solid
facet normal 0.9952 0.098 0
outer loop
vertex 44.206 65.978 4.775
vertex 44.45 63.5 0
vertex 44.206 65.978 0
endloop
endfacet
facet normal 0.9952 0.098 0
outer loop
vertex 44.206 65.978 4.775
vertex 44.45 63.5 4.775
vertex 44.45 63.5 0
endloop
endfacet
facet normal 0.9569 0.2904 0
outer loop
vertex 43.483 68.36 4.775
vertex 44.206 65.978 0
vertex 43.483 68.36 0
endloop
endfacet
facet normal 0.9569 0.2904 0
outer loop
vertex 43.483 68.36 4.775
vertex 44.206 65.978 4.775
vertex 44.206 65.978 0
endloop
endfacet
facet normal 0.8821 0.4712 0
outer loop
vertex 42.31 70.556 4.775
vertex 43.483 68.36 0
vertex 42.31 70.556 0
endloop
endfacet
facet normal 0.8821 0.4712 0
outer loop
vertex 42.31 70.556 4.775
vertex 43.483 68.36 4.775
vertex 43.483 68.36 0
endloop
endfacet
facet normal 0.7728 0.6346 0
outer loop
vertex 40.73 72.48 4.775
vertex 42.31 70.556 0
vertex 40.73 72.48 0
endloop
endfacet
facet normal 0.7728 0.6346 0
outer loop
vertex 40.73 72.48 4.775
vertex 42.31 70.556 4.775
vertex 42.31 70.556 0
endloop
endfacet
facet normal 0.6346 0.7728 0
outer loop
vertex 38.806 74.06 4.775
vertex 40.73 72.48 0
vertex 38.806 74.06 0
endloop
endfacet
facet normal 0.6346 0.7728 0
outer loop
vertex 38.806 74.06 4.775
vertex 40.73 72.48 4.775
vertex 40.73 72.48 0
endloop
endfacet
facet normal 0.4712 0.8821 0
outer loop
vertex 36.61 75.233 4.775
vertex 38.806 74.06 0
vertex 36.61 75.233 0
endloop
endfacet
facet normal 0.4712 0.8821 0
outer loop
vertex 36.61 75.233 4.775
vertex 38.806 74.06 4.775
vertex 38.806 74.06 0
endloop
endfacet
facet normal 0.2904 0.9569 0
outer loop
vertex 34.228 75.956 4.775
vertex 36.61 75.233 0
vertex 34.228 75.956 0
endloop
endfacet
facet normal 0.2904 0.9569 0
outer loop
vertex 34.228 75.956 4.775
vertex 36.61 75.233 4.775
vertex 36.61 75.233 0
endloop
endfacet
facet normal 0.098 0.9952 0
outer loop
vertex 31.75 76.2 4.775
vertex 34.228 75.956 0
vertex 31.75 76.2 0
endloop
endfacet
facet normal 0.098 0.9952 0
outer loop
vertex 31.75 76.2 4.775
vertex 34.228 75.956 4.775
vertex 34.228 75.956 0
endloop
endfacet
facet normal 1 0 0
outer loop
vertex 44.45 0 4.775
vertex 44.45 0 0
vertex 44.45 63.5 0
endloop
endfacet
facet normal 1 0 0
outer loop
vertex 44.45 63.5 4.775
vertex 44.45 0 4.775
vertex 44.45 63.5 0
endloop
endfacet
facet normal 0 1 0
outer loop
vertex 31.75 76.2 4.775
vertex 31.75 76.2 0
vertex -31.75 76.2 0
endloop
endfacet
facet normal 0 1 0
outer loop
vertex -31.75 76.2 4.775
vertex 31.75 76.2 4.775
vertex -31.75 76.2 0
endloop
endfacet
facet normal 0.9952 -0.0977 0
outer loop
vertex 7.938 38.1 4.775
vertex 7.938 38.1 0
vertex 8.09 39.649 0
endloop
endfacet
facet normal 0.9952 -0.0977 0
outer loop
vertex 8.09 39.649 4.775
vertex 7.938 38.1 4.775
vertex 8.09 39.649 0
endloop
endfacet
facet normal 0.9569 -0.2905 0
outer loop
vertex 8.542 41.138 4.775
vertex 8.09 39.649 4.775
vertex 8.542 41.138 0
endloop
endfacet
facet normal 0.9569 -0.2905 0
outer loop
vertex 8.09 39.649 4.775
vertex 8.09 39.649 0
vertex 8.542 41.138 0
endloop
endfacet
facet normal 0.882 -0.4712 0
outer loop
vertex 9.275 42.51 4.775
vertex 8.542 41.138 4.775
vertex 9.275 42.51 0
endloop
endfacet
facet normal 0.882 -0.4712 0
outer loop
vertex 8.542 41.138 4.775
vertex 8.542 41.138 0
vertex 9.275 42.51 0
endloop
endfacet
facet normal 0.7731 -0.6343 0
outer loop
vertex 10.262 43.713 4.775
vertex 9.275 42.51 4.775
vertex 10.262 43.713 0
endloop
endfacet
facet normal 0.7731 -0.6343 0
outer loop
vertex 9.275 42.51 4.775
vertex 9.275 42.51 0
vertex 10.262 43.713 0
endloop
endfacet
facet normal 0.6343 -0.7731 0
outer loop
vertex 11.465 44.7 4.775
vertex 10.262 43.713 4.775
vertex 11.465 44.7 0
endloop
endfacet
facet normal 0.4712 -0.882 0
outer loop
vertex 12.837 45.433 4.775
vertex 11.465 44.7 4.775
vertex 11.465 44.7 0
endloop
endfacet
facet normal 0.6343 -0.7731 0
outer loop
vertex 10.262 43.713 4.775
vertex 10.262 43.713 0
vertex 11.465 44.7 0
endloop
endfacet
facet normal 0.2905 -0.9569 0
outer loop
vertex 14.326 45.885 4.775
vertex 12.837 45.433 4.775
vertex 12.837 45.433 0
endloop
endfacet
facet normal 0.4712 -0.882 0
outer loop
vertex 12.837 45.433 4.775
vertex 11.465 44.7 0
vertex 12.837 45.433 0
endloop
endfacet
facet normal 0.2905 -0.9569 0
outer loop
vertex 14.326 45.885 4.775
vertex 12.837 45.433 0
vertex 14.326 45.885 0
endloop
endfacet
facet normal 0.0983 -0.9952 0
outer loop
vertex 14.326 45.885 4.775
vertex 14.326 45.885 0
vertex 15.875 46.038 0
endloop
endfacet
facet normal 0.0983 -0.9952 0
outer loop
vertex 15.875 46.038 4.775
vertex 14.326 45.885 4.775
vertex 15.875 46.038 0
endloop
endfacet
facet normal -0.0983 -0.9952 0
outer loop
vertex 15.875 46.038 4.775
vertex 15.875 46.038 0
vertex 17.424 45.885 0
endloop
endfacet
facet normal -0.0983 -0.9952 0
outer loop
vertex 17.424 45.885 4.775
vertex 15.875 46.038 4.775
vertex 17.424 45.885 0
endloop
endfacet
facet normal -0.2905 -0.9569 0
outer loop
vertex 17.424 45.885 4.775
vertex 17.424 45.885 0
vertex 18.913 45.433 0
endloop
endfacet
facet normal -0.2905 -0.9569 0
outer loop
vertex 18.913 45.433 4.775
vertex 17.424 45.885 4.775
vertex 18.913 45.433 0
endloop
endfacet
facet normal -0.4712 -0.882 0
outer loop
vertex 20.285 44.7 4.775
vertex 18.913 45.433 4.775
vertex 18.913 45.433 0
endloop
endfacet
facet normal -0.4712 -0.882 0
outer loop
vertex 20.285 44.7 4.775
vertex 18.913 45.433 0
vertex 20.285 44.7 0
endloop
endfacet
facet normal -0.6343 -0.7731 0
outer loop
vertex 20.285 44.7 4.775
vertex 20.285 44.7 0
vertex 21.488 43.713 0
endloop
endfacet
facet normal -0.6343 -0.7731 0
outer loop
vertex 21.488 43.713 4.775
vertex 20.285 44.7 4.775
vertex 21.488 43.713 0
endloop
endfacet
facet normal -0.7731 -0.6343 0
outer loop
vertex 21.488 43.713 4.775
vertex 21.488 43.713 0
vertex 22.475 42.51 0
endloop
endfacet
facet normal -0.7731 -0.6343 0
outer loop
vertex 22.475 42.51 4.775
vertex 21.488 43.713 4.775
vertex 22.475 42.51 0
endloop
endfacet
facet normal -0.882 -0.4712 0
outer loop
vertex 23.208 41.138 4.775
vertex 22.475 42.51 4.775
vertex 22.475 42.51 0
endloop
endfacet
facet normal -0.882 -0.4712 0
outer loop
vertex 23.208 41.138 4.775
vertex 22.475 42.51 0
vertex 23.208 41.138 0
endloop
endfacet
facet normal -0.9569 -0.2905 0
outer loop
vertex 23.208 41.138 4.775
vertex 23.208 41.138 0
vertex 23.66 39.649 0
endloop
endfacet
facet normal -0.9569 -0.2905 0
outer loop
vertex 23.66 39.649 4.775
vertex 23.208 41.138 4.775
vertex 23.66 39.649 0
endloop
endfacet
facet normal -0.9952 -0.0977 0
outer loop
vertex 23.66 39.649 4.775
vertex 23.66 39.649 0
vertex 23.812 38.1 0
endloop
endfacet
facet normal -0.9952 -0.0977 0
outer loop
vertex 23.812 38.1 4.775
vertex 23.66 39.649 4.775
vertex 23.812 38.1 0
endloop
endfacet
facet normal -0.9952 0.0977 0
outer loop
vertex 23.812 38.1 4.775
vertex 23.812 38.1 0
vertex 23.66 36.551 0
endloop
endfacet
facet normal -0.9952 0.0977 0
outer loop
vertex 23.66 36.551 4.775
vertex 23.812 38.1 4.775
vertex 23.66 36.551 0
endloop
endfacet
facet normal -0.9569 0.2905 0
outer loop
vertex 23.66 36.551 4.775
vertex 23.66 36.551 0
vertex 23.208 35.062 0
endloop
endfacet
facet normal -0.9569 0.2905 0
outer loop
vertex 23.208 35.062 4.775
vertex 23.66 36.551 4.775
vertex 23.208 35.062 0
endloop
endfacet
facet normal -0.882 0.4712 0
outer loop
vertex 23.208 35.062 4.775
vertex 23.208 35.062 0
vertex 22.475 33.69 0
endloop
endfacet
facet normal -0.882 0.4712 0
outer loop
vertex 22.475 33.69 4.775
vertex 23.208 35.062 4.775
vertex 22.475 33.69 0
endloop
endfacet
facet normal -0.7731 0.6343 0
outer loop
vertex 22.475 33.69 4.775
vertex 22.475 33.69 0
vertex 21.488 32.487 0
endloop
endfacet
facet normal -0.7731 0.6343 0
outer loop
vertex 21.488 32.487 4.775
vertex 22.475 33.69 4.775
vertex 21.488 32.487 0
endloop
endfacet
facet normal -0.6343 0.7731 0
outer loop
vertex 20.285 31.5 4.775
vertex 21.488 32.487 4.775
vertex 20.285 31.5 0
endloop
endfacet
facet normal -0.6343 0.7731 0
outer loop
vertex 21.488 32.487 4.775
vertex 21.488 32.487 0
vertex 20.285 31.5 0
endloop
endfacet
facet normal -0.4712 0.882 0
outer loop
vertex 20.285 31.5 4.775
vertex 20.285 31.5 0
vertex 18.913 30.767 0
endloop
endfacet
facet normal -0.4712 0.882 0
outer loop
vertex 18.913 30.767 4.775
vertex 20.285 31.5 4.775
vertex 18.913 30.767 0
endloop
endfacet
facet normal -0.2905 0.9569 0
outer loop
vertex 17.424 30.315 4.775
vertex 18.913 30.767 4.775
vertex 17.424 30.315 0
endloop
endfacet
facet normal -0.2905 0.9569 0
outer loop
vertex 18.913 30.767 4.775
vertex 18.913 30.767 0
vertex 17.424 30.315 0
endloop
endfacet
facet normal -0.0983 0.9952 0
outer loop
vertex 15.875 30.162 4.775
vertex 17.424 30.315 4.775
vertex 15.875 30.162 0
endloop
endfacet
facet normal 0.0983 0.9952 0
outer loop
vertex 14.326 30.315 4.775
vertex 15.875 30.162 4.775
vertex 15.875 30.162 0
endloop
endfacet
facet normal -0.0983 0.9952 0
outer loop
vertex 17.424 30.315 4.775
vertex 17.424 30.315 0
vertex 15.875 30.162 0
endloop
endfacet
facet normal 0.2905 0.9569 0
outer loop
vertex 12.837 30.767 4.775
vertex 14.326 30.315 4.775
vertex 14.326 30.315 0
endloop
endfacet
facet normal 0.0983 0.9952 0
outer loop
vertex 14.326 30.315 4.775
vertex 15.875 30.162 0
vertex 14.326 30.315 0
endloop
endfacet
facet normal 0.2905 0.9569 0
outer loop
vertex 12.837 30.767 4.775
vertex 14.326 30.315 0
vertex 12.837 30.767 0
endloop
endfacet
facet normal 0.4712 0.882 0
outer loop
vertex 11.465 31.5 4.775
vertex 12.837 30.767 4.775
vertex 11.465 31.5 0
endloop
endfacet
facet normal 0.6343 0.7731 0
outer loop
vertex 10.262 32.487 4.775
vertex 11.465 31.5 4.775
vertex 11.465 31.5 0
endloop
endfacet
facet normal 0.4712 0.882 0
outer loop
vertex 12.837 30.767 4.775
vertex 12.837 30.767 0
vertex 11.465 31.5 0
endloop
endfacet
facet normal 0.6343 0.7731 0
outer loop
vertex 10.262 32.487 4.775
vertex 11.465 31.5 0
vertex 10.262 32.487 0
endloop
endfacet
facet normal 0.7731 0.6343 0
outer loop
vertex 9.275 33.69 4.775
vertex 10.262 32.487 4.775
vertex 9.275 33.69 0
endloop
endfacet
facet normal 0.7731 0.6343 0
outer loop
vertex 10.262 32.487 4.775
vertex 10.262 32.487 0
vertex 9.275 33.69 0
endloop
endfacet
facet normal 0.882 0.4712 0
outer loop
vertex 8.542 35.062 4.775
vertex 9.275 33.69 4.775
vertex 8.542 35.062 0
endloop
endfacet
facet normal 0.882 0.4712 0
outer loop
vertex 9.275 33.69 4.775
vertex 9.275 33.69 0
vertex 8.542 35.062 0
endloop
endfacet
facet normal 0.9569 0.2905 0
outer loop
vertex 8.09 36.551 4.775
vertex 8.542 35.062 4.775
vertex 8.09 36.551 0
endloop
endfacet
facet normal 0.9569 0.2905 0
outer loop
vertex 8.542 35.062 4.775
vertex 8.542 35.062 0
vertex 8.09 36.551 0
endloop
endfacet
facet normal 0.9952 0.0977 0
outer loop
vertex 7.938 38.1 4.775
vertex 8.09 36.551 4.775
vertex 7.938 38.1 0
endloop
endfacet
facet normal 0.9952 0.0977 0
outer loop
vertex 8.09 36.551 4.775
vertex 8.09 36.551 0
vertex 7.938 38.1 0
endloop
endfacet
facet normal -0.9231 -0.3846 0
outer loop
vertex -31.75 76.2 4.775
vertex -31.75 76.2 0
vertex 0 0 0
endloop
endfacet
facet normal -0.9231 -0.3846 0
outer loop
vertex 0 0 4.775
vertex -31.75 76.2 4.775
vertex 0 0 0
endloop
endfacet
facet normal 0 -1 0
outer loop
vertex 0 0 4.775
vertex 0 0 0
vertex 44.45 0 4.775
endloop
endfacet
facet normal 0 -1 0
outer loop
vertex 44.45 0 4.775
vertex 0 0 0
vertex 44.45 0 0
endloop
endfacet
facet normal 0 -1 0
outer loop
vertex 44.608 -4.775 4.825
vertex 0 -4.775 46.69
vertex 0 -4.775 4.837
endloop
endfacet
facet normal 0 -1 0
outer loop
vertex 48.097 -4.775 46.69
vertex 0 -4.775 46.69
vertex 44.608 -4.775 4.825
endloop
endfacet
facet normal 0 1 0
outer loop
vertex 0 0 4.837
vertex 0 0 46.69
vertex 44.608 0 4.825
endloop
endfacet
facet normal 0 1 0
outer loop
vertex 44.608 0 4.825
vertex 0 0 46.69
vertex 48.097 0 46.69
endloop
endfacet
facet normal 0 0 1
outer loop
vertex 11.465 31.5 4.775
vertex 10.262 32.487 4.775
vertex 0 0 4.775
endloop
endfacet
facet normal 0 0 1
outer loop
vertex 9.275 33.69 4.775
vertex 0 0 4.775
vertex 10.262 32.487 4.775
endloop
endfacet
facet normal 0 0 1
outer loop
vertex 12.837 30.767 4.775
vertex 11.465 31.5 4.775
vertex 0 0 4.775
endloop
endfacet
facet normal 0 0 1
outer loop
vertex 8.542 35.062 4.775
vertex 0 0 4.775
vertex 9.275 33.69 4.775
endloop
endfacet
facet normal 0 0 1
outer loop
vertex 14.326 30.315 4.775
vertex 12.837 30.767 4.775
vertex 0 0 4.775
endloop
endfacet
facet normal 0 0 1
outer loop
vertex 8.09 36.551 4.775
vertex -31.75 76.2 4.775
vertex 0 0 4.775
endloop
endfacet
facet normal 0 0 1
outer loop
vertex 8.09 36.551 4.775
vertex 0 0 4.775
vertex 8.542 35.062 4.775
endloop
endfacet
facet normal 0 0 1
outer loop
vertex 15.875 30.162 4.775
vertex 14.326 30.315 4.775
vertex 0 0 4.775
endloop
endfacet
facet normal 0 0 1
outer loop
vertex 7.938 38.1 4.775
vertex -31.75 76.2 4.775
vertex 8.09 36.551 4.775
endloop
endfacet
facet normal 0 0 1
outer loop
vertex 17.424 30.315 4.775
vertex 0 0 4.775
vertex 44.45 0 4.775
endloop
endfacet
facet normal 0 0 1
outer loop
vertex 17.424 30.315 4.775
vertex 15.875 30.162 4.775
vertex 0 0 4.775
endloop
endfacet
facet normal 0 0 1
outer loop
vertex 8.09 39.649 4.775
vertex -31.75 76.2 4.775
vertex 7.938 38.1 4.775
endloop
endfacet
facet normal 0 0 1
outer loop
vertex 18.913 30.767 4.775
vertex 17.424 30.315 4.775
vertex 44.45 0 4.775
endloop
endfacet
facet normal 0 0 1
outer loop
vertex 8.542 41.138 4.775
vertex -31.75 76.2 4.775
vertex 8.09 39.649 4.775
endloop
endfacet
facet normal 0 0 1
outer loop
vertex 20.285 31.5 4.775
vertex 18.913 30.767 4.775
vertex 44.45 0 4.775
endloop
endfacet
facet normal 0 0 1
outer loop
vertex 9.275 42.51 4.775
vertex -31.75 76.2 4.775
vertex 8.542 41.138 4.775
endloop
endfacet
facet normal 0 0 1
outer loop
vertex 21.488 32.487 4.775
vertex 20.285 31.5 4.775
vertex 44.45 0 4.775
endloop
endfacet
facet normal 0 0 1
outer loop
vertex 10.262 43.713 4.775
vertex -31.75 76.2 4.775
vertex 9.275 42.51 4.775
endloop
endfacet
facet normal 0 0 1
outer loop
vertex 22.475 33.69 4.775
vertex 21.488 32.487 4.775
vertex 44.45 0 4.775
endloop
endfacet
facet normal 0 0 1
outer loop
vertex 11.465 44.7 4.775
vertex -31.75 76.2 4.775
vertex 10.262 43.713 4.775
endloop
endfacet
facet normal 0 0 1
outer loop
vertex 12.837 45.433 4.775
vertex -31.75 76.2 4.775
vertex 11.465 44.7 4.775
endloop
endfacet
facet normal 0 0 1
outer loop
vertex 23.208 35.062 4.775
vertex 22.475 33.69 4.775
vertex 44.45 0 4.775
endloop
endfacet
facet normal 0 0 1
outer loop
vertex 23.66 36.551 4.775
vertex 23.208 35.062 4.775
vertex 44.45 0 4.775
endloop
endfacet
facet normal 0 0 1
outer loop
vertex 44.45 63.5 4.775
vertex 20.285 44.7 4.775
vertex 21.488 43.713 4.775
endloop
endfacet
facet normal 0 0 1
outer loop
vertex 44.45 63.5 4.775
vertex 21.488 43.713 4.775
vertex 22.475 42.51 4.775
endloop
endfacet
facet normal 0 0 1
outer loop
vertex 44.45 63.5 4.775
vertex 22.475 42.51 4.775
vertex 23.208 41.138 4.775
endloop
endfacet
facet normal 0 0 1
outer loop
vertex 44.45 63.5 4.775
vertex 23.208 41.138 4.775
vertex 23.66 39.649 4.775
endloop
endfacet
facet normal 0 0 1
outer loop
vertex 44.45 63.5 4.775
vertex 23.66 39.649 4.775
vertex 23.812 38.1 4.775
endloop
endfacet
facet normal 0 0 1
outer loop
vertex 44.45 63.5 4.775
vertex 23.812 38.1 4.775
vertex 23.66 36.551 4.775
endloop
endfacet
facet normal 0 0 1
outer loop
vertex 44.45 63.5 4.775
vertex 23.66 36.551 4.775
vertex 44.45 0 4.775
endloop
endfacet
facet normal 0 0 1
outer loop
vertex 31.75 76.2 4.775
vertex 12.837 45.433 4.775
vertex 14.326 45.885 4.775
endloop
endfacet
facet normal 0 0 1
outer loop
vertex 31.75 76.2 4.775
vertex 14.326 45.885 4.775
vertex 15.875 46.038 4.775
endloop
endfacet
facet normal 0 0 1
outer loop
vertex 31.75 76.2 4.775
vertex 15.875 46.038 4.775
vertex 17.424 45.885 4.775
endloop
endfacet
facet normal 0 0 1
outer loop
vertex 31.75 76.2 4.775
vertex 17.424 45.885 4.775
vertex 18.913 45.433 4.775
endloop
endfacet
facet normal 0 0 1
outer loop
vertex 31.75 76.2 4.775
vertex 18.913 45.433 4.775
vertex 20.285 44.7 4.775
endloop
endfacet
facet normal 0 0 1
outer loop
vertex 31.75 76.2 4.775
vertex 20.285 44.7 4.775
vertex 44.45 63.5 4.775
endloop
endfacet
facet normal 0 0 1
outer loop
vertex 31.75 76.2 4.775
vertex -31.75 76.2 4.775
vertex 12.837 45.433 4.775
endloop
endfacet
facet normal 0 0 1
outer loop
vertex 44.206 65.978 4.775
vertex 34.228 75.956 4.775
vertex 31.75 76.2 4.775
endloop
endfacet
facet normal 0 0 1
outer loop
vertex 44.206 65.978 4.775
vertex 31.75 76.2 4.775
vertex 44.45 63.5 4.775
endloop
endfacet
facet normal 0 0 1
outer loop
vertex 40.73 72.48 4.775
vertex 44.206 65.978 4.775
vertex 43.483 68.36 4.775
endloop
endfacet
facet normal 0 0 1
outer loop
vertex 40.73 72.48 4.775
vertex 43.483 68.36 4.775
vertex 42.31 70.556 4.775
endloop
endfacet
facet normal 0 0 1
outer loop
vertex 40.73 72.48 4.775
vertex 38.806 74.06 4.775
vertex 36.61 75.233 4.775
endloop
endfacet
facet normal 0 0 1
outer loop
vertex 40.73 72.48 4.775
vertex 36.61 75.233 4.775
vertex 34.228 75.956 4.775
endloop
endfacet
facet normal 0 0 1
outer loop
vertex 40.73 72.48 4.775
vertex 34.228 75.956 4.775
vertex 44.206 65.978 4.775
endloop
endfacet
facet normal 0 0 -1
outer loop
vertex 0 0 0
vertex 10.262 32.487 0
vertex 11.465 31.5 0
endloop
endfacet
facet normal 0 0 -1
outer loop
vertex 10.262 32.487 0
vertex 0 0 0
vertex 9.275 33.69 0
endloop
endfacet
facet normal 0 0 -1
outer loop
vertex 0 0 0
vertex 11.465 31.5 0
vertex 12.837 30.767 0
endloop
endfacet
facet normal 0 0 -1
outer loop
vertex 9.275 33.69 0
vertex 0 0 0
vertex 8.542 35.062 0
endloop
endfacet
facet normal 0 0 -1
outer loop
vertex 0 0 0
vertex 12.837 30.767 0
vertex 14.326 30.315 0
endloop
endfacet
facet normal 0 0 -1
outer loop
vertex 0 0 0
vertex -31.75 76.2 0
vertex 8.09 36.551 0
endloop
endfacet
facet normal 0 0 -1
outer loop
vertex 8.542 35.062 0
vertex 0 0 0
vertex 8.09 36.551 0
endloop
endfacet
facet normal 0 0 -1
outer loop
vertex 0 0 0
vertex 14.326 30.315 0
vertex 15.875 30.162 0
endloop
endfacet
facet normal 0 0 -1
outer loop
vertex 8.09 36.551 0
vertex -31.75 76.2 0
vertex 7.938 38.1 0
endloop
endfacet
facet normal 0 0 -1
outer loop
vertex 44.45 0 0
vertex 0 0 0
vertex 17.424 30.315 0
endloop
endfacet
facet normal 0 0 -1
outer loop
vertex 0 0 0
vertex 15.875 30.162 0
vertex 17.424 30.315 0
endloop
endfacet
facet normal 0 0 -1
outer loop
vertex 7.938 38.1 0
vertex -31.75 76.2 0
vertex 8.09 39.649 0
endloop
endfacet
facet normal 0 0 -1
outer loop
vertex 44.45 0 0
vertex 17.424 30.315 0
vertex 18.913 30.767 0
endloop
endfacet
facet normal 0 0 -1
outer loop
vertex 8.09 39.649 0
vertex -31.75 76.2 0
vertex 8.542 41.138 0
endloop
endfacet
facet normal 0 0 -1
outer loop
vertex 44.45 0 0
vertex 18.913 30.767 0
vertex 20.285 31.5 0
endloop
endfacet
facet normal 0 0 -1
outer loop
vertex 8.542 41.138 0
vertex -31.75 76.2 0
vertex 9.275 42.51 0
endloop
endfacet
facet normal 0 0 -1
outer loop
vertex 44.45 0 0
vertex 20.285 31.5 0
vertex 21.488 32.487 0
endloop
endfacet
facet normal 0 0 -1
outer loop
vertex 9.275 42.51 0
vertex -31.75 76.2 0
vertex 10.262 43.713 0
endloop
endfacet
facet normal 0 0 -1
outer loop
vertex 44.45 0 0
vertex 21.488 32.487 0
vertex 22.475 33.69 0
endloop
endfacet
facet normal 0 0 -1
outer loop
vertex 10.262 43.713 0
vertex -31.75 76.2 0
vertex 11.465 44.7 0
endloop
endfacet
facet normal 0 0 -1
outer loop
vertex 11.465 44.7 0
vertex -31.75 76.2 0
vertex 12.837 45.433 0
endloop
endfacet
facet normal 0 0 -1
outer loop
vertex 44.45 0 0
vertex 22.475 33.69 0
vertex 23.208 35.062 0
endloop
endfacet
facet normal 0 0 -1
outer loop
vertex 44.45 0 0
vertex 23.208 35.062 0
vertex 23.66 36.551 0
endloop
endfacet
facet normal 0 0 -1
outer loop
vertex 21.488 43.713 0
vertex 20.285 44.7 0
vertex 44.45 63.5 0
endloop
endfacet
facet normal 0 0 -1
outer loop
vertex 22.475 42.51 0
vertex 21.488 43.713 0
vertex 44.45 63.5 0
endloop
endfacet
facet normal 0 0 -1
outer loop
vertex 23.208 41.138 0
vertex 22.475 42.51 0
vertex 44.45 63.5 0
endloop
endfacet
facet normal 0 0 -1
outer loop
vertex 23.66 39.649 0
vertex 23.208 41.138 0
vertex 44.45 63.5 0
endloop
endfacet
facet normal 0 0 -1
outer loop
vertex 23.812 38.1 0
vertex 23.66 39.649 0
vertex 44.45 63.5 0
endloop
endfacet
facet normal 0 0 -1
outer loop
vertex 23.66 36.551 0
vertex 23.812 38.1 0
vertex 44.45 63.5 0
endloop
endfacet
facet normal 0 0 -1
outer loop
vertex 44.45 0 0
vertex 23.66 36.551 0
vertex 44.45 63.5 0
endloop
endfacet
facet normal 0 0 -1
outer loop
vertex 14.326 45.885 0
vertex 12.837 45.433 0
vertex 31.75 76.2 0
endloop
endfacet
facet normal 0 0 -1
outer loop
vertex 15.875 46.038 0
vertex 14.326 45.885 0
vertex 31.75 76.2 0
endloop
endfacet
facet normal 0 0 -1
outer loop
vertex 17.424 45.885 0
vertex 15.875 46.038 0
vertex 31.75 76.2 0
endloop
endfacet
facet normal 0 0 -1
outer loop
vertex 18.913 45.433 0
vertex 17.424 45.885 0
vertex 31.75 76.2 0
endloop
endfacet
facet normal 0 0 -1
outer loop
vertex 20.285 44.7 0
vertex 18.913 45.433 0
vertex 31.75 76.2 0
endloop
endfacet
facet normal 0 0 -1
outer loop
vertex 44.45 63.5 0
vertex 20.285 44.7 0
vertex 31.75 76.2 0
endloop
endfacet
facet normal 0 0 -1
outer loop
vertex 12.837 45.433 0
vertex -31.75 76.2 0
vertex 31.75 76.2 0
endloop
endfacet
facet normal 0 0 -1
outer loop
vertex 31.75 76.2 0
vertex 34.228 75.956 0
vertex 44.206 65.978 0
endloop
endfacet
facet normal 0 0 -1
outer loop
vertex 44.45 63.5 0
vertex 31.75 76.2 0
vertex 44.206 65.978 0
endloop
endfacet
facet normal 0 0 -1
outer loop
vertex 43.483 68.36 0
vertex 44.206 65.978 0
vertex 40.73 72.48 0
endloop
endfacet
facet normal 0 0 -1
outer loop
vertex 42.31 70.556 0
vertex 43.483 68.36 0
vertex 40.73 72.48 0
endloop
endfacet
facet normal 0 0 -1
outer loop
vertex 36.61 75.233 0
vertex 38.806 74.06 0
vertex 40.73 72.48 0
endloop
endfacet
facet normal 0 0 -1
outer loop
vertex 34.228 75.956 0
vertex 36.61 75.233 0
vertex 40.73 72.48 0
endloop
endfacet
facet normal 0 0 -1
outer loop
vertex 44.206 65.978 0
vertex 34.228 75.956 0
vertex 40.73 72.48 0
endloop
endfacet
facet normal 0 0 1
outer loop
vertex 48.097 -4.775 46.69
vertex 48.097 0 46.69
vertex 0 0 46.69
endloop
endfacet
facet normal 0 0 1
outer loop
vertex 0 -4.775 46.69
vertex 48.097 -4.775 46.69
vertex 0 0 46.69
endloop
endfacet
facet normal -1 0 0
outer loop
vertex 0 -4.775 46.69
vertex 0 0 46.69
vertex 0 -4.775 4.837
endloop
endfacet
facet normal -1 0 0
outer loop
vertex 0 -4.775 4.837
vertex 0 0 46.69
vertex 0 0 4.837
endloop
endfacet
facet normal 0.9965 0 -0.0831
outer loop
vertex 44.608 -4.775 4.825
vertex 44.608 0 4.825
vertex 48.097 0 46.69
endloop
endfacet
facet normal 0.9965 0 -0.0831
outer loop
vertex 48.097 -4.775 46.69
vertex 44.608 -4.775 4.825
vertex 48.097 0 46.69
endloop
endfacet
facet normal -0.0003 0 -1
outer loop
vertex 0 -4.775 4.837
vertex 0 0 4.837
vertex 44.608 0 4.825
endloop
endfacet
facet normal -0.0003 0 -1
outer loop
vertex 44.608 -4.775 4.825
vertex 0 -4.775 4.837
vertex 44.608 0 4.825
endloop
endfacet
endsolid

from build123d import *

# Parameters (mm, degrees)
F1_DEPTH = 4.7752
F2_R     = 12.7
F4_D     = 15.875
F6_DEPTH = 4.7752


with BuildPart() as f1:
    # F0 (on Top) → F1 (new body)
    with BuildSketch(Plane.XY):
        Polygon((-31.75, 76.2), (0, 0), (44.45, 0), (44.45, 76.2), align=None)
    extrude(amount=F1_DEPTH)

    # F2
    f2_edges = [f1.edges().sort_by_distance(p)[0] for p in [
        (44.45, 76.2, 2.3876),
    ]]
    fillet(f2_edges, radius=F2_R)

    # F4 (through all)
    with Locations(Plane.XY.offset(4.7752)):
        with Locations((15.875, 38.1)):
            Hole(F4_D / 2)


with BuildPart() as f6:
    # F5 (on Front) → F6 (new body)
    with BuildSketch(Plane.XZ):
        Polygon((0, 46.690453), (0, 4.836771), (44.607852, 4.82475), (48.096657, 46.690453), align=None)
    extrude(amount=F6_DEPTH)


solid = Compound([f1.part, f6.part])
